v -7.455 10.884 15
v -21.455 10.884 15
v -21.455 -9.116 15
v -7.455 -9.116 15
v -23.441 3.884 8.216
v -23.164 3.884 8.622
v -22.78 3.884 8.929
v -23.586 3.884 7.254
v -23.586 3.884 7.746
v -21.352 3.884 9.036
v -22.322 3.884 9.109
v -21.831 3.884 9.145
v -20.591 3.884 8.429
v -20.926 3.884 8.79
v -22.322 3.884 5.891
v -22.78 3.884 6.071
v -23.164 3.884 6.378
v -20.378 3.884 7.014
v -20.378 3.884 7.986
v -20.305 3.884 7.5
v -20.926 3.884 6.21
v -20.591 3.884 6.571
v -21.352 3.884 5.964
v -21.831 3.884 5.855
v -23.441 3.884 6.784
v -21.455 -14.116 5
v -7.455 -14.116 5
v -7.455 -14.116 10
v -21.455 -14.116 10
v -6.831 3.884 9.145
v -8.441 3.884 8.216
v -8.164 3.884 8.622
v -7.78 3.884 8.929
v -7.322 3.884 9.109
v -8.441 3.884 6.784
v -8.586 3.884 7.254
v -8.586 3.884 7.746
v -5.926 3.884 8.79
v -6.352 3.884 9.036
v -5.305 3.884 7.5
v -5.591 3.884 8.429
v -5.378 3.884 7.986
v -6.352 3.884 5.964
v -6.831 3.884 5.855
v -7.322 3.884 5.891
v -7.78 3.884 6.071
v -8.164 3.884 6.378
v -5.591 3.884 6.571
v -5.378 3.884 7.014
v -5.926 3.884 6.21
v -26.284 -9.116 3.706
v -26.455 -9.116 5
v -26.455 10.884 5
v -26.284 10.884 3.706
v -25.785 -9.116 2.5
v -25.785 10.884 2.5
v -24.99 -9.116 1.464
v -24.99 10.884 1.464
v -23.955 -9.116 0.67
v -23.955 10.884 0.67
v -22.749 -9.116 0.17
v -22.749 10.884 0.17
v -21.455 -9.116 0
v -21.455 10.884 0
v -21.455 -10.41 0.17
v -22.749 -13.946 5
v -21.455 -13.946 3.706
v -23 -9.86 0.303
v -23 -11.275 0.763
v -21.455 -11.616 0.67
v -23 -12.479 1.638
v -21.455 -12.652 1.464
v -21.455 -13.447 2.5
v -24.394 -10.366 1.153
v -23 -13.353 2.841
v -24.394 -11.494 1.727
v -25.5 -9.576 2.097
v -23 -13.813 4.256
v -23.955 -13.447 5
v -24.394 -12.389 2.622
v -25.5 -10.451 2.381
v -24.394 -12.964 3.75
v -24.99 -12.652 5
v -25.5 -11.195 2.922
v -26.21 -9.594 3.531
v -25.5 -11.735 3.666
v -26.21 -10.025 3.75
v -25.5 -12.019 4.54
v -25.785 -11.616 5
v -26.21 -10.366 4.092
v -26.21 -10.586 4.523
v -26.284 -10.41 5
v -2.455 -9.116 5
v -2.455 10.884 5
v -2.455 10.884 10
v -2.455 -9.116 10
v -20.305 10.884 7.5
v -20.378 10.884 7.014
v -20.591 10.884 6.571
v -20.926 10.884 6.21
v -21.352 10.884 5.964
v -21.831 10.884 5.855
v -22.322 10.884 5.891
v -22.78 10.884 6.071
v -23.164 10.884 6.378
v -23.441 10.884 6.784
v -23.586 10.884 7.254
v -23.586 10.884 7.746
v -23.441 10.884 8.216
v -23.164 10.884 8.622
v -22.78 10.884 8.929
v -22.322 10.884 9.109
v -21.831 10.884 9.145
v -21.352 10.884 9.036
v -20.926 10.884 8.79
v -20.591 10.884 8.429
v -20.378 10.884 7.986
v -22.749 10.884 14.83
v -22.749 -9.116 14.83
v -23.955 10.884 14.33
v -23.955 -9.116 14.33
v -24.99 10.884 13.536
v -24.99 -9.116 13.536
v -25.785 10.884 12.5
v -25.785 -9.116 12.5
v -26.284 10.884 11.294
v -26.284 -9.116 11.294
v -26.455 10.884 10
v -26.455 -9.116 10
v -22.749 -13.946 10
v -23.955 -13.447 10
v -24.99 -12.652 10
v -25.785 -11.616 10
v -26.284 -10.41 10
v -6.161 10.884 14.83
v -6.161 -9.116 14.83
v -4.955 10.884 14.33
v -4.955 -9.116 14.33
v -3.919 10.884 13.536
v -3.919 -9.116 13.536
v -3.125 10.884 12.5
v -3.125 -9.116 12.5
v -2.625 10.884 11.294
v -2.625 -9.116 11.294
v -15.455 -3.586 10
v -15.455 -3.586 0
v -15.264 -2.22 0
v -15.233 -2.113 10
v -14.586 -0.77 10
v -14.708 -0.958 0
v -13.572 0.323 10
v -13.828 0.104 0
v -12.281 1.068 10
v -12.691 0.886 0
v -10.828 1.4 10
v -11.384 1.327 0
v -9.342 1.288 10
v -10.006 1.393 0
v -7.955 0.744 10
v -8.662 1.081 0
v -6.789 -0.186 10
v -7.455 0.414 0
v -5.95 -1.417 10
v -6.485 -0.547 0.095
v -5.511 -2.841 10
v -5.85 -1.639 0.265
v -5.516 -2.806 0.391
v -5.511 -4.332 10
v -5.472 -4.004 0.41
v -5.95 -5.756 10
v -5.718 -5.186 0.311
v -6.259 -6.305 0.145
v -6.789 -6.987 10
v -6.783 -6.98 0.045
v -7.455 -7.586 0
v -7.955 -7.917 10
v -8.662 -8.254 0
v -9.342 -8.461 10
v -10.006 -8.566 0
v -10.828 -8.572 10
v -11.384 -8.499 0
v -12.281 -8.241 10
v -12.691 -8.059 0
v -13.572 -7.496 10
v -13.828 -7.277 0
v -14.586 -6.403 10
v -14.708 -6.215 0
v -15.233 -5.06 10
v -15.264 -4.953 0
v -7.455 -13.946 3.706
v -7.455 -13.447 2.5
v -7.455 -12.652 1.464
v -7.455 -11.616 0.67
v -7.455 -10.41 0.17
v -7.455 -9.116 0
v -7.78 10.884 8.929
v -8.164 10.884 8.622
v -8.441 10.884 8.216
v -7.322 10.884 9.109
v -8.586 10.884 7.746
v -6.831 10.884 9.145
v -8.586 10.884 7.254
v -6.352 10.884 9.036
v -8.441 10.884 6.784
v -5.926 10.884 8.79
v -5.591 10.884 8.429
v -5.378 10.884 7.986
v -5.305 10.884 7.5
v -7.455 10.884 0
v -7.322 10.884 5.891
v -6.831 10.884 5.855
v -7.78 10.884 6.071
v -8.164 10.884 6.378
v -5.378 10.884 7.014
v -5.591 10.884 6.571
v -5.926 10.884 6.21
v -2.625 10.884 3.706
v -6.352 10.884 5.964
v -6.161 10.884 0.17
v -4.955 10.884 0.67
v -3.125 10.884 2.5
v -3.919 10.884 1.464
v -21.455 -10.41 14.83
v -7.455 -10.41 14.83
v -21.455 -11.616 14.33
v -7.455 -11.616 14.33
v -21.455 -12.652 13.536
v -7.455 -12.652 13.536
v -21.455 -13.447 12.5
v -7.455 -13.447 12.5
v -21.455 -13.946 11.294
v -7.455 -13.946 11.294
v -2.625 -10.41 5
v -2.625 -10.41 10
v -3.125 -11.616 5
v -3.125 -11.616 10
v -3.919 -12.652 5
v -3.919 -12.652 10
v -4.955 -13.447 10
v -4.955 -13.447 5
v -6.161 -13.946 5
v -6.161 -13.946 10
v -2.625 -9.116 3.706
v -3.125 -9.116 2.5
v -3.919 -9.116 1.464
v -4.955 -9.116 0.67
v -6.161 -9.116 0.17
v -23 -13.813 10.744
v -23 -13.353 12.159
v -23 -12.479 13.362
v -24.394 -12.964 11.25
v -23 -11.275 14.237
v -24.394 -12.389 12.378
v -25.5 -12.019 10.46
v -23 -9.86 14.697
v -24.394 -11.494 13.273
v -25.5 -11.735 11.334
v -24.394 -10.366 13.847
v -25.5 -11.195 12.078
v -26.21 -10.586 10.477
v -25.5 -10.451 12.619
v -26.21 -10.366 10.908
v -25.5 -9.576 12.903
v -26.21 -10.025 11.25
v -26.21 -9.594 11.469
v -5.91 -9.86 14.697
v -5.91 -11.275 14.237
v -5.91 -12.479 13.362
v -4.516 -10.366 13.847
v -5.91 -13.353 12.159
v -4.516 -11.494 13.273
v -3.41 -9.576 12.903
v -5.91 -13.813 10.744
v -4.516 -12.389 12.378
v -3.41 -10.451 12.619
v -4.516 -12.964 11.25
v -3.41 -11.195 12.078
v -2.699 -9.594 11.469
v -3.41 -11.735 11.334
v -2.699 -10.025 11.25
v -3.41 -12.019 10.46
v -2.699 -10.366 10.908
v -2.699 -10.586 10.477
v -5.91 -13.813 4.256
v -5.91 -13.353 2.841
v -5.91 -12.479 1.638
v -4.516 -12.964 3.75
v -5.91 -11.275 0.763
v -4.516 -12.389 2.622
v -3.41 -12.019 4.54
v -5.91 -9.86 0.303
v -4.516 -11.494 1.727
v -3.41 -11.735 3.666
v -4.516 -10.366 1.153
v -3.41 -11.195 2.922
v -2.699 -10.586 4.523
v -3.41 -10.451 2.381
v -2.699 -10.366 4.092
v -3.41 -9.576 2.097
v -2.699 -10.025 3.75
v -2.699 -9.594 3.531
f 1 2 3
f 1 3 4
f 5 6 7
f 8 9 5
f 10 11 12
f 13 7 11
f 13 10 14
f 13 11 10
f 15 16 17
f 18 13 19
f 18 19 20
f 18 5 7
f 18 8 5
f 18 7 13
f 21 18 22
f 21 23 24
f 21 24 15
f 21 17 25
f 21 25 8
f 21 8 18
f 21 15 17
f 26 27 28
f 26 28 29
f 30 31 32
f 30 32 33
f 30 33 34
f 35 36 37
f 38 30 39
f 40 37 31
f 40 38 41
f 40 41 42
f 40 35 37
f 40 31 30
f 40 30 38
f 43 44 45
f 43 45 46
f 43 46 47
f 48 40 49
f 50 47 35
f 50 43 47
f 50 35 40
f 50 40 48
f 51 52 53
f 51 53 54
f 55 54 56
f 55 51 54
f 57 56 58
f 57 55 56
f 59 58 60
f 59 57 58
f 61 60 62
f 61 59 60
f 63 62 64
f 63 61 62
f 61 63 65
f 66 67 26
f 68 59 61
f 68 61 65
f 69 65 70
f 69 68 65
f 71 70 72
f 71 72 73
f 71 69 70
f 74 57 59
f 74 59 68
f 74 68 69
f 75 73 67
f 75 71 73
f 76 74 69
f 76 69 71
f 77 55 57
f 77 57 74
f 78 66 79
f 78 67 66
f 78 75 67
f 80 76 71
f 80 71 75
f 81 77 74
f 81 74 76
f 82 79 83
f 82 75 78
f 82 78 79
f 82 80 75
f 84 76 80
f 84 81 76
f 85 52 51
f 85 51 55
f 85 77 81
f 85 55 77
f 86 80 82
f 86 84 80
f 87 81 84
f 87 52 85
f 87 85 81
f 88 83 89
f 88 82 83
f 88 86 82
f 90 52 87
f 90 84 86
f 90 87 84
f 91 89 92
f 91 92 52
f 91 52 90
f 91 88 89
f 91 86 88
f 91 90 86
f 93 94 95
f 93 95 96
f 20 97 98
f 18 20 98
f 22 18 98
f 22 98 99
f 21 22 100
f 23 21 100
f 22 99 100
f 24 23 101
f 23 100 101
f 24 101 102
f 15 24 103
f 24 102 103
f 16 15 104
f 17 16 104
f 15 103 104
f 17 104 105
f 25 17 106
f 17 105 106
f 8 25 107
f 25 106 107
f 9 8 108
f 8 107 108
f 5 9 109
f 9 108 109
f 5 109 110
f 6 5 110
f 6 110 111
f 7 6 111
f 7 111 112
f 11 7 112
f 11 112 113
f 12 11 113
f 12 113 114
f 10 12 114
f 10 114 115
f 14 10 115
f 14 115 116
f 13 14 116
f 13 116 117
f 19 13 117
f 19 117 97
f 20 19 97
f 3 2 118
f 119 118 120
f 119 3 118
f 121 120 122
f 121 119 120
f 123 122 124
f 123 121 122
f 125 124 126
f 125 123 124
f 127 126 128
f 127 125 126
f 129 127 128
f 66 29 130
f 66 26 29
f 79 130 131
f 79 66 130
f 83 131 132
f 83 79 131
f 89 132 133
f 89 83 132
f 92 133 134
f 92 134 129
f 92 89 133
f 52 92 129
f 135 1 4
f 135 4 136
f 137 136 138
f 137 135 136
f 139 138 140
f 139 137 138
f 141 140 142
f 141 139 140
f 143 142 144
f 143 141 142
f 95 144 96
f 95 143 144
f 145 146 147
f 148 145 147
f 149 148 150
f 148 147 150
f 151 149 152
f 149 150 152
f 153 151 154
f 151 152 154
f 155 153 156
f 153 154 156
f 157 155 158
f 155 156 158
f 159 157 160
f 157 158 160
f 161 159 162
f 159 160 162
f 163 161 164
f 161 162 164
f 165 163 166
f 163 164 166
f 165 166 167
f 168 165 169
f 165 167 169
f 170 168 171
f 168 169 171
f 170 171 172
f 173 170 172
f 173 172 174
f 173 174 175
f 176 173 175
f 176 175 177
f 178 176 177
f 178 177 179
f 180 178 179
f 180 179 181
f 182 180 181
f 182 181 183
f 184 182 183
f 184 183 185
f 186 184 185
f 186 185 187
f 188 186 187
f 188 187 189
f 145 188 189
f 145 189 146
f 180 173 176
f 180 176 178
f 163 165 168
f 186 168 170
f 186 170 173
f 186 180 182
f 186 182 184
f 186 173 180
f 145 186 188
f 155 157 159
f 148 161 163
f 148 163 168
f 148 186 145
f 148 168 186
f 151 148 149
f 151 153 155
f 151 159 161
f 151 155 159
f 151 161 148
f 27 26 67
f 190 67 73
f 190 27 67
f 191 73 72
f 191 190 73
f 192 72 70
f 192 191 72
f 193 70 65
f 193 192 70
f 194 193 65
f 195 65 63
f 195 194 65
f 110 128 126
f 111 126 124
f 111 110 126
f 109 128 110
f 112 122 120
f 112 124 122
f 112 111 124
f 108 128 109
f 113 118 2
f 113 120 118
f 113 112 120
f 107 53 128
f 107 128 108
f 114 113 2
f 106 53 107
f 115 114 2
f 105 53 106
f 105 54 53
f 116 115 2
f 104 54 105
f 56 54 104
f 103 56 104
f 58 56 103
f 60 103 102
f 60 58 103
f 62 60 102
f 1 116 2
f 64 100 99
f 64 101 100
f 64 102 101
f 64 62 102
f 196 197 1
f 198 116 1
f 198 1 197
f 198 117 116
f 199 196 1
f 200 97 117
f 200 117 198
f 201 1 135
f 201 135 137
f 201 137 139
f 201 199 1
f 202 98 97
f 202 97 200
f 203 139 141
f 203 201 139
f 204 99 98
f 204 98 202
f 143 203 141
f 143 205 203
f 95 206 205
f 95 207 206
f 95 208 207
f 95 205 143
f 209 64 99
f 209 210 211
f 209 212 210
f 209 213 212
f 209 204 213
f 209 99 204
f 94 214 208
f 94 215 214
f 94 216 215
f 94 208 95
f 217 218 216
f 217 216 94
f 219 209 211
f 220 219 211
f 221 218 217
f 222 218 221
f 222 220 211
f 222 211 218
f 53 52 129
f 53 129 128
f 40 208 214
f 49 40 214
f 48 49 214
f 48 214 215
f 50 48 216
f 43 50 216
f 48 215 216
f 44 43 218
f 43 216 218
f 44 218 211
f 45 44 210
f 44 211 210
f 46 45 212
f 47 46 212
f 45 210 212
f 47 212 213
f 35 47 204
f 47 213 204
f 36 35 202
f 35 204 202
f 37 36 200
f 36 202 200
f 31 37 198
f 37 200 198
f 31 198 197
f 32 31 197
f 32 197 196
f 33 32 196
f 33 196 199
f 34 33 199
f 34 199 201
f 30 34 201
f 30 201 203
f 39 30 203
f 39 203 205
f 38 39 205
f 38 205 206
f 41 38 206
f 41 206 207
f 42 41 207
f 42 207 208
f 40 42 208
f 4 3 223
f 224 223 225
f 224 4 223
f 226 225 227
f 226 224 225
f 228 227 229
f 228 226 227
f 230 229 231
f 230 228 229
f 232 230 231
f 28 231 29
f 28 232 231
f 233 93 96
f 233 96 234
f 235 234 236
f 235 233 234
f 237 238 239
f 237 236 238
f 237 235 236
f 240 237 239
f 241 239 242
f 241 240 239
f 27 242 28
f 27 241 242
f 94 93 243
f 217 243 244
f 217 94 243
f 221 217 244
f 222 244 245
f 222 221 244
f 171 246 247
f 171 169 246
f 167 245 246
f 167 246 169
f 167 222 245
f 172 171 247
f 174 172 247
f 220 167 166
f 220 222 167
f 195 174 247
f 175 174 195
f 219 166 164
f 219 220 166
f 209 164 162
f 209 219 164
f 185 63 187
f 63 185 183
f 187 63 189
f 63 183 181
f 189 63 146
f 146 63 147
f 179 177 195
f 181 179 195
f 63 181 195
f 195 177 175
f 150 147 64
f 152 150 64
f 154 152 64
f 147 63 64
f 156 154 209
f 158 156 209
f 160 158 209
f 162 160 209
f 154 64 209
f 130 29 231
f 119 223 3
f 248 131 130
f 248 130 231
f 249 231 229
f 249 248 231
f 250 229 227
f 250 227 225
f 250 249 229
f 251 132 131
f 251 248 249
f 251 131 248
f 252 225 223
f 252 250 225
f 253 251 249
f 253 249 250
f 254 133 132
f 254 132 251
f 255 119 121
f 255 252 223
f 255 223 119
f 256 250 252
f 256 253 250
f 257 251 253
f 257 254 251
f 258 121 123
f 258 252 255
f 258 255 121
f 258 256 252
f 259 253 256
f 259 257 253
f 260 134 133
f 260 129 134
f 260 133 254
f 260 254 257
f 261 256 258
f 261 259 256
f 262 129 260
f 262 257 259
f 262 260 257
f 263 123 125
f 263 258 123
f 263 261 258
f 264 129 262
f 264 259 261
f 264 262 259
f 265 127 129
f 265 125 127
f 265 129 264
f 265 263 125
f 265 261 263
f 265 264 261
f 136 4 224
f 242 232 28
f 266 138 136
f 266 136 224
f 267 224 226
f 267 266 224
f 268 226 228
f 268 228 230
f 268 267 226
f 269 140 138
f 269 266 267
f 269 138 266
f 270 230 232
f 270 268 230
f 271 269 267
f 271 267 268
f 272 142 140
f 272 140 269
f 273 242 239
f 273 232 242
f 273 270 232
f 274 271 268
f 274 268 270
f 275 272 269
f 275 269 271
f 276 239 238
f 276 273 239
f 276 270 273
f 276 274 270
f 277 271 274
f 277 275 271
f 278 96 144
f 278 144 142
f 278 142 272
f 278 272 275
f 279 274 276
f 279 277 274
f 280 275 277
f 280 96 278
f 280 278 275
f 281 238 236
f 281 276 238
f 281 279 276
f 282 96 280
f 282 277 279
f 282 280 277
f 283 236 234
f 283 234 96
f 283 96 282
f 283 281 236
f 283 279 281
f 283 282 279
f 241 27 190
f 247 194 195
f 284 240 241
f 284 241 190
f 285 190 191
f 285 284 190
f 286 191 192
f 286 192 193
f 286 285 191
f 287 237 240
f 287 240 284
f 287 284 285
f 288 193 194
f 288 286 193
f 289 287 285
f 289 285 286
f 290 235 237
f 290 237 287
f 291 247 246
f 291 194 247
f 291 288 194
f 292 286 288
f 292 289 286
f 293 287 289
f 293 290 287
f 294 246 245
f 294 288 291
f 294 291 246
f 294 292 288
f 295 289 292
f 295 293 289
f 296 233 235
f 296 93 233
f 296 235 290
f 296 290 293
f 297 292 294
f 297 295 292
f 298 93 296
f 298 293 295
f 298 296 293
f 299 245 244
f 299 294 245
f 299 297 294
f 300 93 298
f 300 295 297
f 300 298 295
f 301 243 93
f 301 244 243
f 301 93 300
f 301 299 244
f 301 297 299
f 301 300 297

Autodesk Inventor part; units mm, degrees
ref_plane "YZ Plane" through (0, 0, 0) normal (1, 0, 0) x (0, 1, 0)
ref_plane "XZ Plane" through (0, 0, 0) normal (0, 1, 0) x (-1, 0, 0)
ref_plane "XY Plane" through (0, 0, 0) normal (0, 0, 1) x (1, 0, 0)
sketch "スケッチ1" plane through (0, 0, 0) normal (0, 0, 1) x (1, 0, 0)
  line L0 (-26.4547, 10.8836) -> (-2.4547, 10.8836)
  line L1 (-2.4547, 10.8836) -> (-2.4547, -14.1164)
  line L2 (-2.4547, -14.1164) -> (-26.4547, -14.1164)
  line L3 (-26.4547, -14.1164) -> (-26.4547, 10.8836)
  point P0 (0, 0)
  dimension "d0" = 25
  dimension "d1" = 24
extrude "押し出し1" add sketch "スケッチ1" along normal blind 15
sketch "スケッチ3" plane through (0, 0, 0) normal (0, 0, -1) x (-1, 0, 0)
  circle A0 centre (10.4547, -3.5864) radius 5
  line L0 (26.4547, 10.8836) -> (2.4547, 10.8836) projected
  line L1 (2.4547, 10.8836) -> (2.4547, -14.1164) projected
  point P0 (0, 0)
  dimension "d7" = 10
  dimension "d8" = 14.47
  dimension "d9" = 8
extrude "押し出し2" cut sketch "スケッチ3" against normal blind 10
fillet "フィレット1" radius 5 8 edges at (-2.4547, -14.1164, 7.5) (-14.4547, -14.1164, 15) (-14.4547, -14.1164, 0) (-26.4547, -1.6164, 15) (-26.4547, -14.1164, 7.5) (-26.4547, -1.6164, 0) (-2.4547, -1.6164, 15) (-2.4547, -1.6164, 0)
sketch "スケッチ4" plane through (-21.4547, 10.8836, 0) normal (0, 1, 0) x (1, 0, 0)
  arc A0 (19, -5) -> (14, 0) centre (14, -5) ccw projected
  line L0 (0, 0) -> (14, 0) projected
  arc A1 (0, 0) -> (-5, -5) centre (0, -5) ccw projected
  line L1 (-5, -5) -> (-5, -10) projected
  arc A2 (-5, -10) -> (0, -15) centre (0, -10) ccw projected
  line L2 (14, -15) -> (0, -15) projected
  arc A3 (14, -15) -> (19, -10) centre (14, -10) ccw projected
  line L3 (19, -5) -> (19, -10) projected
  circle A4 centre (14.5, -7.5) radius 1.65
  circle A5 centre (-0.5, -7.5) radius 1.65
  point P0 (21.4547, 0)
  dimension "d13" = 3.3
  dimension "d14" = 4.5
  dimension "d15" = 7.5
  dimension "d22" = 15
  dimension "d23" = 3.3
  dimension "d24" = 7.5
extrude "押し出し3" cut sketch "スケッチ4" against normal blind 7 contours A4 | A5
properties part number "door_parts" material "PAEK 樹脂"
